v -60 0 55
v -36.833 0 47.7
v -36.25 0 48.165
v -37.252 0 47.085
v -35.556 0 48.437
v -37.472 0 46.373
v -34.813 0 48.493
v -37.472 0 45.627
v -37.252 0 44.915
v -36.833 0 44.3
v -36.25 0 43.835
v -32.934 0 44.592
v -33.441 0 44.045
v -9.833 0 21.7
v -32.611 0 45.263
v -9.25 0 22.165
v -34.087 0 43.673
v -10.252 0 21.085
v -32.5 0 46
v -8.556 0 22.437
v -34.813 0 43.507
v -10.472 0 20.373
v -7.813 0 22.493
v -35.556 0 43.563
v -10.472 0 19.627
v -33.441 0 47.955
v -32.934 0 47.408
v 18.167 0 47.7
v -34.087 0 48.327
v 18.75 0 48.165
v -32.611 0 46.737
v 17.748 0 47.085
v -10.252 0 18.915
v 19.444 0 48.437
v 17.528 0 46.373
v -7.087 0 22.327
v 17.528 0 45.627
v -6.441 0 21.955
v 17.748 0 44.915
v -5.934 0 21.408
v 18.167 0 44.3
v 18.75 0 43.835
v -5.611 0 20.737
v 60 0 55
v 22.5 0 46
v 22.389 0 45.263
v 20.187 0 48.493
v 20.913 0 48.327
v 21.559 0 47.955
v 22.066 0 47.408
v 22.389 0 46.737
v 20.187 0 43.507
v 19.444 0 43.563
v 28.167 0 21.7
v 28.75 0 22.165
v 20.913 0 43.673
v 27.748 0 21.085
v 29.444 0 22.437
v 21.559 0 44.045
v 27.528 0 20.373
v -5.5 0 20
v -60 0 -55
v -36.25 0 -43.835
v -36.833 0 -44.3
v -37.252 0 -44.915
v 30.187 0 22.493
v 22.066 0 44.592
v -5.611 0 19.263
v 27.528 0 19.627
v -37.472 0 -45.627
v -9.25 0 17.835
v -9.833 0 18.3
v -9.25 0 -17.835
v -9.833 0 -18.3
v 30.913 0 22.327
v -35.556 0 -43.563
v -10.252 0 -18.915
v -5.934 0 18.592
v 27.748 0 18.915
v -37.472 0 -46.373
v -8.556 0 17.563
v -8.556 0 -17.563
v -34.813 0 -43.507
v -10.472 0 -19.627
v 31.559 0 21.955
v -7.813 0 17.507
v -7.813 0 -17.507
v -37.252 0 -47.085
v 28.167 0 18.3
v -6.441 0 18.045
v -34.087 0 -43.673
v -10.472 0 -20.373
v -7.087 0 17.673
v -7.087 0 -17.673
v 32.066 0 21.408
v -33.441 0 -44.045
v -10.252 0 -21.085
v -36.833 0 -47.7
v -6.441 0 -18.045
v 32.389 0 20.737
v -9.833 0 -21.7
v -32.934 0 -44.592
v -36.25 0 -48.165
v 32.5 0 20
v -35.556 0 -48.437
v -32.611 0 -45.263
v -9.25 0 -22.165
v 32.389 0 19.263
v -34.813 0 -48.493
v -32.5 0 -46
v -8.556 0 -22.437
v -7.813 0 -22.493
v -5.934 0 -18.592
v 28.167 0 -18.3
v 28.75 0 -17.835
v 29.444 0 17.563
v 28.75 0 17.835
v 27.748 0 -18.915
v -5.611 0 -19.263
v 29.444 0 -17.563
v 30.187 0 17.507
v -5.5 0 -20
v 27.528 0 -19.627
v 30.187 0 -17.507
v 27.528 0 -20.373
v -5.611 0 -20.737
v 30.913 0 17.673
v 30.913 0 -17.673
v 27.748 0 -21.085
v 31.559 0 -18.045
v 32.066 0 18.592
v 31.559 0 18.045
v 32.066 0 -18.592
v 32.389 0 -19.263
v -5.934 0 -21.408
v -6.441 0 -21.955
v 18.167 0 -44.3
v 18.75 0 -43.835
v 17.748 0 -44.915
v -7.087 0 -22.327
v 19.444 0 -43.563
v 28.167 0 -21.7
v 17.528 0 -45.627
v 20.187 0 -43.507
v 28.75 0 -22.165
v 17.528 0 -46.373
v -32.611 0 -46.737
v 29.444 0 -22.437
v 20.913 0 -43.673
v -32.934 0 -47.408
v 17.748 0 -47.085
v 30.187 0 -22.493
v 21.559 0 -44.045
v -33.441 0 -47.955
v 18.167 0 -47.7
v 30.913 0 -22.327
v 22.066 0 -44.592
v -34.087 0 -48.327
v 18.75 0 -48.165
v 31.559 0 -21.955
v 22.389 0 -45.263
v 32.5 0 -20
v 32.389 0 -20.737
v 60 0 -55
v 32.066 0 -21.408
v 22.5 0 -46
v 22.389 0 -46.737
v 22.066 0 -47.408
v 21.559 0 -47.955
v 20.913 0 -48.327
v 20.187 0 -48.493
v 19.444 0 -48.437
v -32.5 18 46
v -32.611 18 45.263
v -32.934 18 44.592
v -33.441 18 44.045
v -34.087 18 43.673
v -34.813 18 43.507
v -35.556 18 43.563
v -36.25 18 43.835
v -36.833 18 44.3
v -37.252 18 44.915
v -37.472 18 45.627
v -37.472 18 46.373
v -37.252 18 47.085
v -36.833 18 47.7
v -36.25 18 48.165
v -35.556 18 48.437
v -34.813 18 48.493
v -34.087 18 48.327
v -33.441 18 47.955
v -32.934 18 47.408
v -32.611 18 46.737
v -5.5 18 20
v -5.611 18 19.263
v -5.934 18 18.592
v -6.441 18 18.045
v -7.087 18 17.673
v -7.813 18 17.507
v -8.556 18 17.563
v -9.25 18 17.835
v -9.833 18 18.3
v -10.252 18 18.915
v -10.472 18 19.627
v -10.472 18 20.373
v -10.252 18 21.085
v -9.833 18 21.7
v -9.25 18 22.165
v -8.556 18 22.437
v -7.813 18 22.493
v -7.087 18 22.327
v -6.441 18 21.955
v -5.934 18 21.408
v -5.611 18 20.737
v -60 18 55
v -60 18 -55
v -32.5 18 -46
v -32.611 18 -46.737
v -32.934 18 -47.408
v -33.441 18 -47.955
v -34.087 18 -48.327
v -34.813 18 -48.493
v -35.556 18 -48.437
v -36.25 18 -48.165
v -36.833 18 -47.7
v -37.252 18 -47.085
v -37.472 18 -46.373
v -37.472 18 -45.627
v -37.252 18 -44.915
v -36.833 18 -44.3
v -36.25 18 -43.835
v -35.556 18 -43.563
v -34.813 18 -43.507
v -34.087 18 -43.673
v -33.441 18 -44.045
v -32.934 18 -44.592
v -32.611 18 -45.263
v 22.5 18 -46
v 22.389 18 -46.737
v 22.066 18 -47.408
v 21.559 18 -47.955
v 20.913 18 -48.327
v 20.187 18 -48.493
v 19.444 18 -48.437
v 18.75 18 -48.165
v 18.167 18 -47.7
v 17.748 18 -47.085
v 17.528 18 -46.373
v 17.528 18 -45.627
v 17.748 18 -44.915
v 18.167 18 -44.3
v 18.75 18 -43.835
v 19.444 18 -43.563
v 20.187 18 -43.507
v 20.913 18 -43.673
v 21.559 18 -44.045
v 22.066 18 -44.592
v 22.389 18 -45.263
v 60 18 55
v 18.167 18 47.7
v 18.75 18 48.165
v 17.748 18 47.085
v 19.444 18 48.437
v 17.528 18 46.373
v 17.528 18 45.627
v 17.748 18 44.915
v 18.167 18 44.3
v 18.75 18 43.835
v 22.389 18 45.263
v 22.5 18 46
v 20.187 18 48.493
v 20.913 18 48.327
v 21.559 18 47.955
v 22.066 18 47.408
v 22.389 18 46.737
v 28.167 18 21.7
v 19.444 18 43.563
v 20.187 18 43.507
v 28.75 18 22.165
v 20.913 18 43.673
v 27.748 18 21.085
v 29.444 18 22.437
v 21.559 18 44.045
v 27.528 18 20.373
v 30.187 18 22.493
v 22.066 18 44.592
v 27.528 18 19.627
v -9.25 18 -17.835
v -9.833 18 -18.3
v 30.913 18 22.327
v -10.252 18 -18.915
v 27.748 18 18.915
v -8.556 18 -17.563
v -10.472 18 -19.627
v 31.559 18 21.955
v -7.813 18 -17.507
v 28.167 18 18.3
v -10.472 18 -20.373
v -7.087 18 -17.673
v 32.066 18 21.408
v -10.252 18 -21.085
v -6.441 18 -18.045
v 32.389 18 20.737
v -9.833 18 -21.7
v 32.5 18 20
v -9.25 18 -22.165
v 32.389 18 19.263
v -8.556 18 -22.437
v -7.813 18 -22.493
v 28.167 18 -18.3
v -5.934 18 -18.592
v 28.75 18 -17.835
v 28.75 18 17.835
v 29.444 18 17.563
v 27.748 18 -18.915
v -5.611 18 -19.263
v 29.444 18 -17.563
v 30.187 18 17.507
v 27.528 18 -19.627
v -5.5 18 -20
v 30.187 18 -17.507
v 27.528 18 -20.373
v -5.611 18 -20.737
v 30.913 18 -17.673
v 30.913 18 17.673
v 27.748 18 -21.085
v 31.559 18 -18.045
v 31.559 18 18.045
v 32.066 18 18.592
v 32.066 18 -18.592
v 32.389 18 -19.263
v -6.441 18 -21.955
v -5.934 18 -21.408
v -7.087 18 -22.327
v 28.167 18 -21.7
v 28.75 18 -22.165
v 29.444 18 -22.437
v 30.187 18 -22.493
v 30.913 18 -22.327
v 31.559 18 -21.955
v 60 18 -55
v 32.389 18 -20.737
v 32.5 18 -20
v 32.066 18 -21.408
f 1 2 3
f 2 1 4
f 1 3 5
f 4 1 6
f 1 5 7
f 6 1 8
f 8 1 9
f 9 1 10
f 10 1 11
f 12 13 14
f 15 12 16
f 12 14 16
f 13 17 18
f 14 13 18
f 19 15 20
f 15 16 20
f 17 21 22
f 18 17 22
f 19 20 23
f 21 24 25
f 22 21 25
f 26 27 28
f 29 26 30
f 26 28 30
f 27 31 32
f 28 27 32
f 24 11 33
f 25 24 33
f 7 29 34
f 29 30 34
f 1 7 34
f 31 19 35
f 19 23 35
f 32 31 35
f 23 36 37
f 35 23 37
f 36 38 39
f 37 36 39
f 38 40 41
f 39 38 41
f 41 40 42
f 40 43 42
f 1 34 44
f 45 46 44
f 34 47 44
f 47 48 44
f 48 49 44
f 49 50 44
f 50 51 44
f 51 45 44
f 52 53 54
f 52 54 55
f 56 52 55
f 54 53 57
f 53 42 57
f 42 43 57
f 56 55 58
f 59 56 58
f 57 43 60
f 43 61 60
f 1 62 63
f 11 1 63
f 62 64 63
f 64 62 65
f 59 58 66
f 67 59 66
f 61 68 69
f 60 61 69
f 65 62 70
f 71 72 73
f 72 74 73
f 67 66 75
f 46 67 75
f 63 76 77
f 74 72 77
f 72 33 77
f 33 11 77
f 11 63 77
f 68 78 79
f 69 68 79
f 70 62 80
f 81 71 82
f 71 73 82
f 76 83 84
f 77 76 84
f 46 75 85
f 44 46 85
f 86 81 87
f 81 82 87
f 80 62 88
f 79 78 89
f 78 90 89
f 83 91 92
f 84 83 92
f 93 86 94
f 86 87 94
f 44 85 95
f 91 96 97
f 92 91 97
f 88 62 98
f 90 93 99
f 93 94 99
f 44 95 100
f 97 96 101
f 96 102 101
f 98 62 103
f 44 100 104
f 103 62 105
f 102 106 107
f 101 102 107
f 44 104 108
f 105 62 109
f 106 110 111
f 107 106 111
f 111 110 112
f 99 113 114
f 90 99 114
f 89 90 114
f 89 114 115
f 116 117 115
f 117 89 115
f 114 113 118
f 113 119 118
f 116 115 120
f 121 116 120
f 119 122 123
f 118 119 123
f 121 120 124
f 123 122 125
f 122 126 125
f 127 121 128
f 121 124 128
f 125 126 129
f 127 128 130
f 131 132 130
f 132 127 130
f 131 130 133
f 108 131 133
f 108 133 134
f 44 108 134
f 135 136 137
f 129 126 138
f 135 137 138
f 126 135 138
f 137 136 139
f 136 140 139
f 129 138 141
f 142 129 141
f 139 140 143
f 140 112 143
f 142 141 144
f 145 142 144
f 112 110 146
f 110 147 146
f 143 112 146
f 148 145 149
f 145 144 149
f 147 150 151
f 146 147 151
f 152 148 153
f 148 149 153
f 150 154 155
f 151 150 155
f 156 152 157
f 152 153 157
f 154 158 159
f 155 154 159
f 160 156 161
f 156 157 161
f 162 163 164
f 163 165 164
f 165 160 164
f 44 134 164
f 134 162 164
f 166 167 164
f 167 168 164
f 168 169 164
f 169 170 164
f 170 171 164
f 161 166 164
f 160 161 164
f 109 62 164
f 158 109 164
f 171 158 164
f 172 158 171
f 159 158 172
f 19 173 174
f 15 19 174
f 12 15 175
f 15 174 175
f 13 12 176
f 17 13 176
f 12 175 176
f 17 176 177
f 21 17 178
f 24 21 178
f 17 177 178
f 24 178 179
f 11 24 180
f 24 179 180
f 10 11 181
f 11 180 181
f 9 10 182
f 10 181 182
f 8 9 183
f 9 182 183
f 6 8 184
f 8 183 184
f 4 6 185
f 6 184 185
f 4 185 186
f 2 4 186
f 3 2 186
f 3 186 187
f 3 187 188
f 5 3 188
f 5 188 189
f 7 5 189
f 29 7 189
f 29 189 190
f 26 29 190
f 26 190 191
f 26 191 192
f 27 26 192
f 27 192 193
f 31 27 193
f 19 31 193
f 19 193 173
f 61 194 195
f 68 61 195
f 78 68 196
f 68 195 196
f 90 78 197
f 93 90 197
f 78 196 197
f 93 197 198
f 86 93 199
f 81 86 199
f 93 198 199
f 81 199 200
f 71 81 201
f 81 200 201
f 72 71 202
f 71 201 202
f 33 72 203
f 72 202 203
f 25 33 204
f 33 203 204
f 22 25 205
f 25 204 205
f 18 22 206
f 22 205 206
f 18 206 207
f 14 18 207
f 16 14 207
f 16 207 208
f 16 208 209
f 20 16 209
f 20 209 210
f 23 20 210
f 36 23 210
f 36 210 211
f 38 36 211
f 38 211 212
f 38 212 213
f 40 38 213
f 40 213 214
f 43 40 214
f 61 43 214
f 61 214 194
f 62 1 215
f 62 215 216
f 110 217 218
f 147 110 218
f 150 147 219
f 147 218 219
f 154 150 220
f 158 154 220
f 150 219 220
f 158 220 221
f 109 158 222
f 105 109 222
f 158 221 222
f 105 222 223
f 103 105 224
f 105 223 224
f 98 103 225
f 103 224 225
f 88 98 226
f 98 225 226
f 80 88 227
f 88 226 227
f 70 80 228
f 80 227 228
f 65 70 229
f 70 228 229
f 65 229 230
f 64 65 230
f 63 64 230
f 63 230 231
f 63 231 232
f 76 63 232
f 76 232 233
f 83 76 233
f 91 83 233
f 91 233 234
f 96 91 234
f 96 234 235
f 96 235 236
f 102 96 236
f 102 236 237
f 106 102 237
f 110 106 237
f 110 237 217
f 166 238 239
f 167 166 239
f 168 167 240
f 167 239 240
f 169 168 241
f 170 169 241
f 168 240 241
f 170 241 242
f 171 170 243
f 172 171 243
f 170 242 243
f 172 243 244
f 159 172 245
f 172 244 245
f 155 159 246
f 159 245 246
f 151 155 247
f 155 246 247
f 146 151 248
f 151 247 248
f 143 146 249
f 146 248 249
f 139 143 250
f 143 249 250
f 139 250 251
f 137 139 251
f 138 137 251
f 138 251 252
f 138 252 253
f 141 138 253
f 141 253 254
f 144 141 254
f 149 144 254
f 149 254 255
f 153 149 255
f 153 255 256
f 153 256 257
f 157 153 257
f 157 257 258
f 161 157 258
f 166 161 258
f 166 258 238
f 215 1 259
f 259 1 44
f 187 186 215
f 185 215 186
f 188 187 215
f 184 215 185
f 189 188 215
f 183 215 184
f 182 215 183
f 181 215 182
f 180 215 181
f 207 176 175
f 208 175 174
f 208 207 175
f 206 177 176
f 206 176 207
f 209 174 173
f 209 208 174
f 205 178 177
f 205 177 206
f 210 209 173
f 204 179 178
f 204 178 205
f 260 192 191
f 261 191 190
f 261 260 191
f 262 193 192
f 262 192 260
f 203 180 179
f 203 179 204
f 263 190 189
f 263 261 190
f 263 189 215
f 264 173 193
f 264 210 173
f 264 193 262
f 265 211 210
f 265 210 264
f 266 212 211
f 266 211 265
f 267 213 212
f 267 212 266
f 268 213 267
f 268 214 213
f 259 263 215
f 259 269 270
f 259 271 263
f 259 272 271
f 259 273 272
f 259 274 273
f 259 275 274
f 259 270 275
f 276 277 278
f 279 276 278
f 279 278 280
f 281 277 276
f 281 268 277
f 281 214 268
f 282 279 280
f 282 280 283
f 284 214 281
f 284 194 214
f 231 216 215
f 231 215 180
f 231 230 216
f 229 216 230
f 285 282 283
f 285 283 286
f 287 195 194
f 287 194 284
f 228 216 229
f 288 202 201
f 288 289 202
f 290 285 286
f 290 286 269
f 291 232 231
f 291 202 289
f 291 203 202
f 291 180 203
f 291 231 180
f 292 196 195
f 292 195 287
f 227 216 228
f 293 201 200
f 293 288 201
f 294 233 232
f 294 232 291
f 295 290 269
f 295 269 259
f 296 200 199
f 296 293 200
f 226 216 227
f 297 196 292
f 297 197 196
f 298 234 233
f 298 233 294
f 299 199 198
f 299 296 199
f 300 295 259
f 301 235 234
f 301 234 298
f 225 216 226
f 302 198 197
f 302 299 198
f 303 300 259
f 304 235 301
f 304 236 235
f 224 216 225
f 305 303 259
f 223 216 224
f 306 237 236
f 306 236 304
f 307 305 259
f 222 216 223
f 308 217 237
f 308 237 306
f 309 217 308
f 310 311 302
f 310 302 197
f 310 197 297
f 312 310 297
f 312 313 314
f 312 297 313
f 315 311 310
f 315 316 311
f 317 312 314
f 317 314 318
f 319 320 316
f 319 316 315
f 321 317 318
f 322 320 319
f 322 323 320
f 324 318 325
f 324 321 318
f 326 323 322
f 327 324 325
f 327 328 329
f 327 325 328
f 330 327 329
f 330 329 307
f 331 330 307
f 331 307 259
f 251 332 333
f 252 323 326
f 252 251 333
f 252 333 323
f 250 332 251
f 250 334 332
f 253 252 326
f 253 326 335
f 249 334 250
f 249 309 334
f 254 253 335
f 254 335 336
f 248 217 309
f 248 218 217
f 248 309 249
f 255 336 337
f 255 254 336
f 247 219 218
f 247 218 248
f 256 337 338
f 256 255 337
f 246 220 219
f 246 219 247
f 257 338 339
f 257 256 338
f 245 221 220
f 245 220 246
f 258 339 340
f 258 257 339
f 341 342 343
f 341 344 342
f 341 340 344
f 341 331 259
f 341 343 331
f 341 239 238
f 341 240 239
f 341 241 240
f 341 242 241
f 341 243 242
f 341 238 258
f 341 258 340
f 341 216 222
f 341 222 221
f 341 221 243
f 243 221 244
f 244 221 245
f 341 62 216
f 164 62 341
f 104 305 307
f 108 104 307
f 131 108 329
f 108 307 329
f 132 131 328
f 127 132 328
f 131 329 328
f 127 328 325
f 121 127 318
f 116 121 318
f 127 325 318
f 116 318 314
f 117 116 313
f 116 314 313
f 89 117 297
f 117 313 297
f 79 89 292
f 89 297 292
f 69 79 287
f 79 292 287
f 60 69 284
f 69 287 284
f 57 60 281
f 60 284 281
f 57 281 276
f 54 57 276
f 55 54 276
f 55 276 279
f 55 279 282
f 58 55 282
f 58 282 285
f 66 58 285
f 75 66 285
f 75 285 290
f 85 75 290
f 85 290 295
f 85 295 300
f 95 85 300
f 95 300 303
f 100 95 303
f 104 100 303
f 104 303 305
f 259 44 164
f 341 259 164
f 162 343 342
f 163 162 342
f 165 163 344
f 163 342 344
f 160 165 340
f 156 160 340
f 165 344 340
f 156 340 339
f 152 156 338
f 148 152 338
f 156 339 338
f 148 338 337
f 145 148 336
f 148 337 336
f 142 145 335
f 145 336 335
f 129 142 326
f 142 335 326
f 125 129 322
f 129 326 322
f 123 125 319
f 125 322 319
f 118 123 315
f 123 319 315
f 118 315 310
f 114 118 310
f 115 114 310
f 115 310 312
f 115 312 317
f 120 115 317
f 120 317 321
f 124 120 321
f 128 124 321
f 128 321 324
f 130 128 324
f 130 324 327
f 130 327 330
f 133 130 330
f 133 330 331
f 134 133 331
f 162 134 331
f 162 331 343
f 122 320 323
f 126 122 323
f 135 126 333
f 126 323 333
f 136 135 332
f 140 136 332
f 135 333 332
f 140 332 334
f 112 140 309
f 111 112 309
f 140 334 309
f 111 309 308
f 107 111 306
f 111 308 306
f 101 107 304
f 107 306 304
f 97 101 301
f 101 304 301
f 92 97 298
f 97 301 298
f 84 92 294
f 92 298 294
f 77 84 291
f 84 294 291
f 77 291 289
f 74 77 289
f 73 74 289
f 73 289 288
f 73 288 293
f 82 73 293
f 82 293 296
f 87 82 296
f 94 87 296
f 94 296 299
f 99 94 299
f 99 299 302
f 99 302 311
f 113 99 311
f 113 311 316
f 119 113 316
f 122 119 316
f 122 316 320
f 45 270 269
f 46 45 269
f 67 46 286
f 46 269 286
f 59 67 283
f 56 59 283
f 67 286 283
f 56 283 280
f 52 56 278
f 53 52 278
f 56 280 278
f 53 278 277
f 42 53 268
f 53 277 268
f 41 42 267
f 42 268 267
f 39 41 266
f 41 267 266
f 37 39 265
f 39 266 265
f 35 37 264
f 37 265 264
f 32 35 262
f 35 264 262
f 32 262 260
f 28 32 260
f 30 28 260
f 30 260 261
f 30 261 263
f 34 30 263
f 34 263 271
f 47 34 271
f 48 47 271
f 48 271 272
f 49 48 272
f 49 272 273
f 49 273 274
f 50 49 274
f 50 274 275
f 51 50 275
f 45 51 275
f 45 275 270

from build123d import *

# Parameters (mm, degrees)
SKETCH1_W                = 120
SKETCH1_H                = 110
BOSS_EXTRUDE1_DEPTH      = 18
F_5_0_5_DIAMETER_HOLE1_D = 5
F_5_0_5_DIAMETER_HOLE3_D = 5


with BuildPart() as part:
    # Sketch1 → Boss-Extrude1 (new body)
    with BuildSketch(Plane(origin=(0, 0, 0), x_dir=(1, 0, 0), z_dir=(0, 1, 0))):
        Rectangle(SKETCH1_W, SKETCH1_H)
    extrude(amount=BOSS_EXTRUDE1_DEPTH)

    # Ø5.0 (5) Diameter Hole1 (through all)
    with Locations(Plane(origin=(0, 0, 0), x_dir=(-1, 0, 0), z_dir=(0, -1, 0))):
        with Locations((-20, 46), (35, 46), (35, -46), (-20, -46)):
            Hole(F_5_0_5_DIAMETER_HOLE1_D / 2)

    # Ø5.0 (5) Diameter Hole3 (through all)
    with Locations(Plane(origin=(0, 0, 0), x_dir=(-1, 0, 0), z_dir=(0, -1, 0))):
        with Locations((8, 20), (-30, 20), (-30, -20), (8, -20)):
            Hole(F_5_0_5_DIAMETER_HOLE3_D / 2)


solid = part.part
